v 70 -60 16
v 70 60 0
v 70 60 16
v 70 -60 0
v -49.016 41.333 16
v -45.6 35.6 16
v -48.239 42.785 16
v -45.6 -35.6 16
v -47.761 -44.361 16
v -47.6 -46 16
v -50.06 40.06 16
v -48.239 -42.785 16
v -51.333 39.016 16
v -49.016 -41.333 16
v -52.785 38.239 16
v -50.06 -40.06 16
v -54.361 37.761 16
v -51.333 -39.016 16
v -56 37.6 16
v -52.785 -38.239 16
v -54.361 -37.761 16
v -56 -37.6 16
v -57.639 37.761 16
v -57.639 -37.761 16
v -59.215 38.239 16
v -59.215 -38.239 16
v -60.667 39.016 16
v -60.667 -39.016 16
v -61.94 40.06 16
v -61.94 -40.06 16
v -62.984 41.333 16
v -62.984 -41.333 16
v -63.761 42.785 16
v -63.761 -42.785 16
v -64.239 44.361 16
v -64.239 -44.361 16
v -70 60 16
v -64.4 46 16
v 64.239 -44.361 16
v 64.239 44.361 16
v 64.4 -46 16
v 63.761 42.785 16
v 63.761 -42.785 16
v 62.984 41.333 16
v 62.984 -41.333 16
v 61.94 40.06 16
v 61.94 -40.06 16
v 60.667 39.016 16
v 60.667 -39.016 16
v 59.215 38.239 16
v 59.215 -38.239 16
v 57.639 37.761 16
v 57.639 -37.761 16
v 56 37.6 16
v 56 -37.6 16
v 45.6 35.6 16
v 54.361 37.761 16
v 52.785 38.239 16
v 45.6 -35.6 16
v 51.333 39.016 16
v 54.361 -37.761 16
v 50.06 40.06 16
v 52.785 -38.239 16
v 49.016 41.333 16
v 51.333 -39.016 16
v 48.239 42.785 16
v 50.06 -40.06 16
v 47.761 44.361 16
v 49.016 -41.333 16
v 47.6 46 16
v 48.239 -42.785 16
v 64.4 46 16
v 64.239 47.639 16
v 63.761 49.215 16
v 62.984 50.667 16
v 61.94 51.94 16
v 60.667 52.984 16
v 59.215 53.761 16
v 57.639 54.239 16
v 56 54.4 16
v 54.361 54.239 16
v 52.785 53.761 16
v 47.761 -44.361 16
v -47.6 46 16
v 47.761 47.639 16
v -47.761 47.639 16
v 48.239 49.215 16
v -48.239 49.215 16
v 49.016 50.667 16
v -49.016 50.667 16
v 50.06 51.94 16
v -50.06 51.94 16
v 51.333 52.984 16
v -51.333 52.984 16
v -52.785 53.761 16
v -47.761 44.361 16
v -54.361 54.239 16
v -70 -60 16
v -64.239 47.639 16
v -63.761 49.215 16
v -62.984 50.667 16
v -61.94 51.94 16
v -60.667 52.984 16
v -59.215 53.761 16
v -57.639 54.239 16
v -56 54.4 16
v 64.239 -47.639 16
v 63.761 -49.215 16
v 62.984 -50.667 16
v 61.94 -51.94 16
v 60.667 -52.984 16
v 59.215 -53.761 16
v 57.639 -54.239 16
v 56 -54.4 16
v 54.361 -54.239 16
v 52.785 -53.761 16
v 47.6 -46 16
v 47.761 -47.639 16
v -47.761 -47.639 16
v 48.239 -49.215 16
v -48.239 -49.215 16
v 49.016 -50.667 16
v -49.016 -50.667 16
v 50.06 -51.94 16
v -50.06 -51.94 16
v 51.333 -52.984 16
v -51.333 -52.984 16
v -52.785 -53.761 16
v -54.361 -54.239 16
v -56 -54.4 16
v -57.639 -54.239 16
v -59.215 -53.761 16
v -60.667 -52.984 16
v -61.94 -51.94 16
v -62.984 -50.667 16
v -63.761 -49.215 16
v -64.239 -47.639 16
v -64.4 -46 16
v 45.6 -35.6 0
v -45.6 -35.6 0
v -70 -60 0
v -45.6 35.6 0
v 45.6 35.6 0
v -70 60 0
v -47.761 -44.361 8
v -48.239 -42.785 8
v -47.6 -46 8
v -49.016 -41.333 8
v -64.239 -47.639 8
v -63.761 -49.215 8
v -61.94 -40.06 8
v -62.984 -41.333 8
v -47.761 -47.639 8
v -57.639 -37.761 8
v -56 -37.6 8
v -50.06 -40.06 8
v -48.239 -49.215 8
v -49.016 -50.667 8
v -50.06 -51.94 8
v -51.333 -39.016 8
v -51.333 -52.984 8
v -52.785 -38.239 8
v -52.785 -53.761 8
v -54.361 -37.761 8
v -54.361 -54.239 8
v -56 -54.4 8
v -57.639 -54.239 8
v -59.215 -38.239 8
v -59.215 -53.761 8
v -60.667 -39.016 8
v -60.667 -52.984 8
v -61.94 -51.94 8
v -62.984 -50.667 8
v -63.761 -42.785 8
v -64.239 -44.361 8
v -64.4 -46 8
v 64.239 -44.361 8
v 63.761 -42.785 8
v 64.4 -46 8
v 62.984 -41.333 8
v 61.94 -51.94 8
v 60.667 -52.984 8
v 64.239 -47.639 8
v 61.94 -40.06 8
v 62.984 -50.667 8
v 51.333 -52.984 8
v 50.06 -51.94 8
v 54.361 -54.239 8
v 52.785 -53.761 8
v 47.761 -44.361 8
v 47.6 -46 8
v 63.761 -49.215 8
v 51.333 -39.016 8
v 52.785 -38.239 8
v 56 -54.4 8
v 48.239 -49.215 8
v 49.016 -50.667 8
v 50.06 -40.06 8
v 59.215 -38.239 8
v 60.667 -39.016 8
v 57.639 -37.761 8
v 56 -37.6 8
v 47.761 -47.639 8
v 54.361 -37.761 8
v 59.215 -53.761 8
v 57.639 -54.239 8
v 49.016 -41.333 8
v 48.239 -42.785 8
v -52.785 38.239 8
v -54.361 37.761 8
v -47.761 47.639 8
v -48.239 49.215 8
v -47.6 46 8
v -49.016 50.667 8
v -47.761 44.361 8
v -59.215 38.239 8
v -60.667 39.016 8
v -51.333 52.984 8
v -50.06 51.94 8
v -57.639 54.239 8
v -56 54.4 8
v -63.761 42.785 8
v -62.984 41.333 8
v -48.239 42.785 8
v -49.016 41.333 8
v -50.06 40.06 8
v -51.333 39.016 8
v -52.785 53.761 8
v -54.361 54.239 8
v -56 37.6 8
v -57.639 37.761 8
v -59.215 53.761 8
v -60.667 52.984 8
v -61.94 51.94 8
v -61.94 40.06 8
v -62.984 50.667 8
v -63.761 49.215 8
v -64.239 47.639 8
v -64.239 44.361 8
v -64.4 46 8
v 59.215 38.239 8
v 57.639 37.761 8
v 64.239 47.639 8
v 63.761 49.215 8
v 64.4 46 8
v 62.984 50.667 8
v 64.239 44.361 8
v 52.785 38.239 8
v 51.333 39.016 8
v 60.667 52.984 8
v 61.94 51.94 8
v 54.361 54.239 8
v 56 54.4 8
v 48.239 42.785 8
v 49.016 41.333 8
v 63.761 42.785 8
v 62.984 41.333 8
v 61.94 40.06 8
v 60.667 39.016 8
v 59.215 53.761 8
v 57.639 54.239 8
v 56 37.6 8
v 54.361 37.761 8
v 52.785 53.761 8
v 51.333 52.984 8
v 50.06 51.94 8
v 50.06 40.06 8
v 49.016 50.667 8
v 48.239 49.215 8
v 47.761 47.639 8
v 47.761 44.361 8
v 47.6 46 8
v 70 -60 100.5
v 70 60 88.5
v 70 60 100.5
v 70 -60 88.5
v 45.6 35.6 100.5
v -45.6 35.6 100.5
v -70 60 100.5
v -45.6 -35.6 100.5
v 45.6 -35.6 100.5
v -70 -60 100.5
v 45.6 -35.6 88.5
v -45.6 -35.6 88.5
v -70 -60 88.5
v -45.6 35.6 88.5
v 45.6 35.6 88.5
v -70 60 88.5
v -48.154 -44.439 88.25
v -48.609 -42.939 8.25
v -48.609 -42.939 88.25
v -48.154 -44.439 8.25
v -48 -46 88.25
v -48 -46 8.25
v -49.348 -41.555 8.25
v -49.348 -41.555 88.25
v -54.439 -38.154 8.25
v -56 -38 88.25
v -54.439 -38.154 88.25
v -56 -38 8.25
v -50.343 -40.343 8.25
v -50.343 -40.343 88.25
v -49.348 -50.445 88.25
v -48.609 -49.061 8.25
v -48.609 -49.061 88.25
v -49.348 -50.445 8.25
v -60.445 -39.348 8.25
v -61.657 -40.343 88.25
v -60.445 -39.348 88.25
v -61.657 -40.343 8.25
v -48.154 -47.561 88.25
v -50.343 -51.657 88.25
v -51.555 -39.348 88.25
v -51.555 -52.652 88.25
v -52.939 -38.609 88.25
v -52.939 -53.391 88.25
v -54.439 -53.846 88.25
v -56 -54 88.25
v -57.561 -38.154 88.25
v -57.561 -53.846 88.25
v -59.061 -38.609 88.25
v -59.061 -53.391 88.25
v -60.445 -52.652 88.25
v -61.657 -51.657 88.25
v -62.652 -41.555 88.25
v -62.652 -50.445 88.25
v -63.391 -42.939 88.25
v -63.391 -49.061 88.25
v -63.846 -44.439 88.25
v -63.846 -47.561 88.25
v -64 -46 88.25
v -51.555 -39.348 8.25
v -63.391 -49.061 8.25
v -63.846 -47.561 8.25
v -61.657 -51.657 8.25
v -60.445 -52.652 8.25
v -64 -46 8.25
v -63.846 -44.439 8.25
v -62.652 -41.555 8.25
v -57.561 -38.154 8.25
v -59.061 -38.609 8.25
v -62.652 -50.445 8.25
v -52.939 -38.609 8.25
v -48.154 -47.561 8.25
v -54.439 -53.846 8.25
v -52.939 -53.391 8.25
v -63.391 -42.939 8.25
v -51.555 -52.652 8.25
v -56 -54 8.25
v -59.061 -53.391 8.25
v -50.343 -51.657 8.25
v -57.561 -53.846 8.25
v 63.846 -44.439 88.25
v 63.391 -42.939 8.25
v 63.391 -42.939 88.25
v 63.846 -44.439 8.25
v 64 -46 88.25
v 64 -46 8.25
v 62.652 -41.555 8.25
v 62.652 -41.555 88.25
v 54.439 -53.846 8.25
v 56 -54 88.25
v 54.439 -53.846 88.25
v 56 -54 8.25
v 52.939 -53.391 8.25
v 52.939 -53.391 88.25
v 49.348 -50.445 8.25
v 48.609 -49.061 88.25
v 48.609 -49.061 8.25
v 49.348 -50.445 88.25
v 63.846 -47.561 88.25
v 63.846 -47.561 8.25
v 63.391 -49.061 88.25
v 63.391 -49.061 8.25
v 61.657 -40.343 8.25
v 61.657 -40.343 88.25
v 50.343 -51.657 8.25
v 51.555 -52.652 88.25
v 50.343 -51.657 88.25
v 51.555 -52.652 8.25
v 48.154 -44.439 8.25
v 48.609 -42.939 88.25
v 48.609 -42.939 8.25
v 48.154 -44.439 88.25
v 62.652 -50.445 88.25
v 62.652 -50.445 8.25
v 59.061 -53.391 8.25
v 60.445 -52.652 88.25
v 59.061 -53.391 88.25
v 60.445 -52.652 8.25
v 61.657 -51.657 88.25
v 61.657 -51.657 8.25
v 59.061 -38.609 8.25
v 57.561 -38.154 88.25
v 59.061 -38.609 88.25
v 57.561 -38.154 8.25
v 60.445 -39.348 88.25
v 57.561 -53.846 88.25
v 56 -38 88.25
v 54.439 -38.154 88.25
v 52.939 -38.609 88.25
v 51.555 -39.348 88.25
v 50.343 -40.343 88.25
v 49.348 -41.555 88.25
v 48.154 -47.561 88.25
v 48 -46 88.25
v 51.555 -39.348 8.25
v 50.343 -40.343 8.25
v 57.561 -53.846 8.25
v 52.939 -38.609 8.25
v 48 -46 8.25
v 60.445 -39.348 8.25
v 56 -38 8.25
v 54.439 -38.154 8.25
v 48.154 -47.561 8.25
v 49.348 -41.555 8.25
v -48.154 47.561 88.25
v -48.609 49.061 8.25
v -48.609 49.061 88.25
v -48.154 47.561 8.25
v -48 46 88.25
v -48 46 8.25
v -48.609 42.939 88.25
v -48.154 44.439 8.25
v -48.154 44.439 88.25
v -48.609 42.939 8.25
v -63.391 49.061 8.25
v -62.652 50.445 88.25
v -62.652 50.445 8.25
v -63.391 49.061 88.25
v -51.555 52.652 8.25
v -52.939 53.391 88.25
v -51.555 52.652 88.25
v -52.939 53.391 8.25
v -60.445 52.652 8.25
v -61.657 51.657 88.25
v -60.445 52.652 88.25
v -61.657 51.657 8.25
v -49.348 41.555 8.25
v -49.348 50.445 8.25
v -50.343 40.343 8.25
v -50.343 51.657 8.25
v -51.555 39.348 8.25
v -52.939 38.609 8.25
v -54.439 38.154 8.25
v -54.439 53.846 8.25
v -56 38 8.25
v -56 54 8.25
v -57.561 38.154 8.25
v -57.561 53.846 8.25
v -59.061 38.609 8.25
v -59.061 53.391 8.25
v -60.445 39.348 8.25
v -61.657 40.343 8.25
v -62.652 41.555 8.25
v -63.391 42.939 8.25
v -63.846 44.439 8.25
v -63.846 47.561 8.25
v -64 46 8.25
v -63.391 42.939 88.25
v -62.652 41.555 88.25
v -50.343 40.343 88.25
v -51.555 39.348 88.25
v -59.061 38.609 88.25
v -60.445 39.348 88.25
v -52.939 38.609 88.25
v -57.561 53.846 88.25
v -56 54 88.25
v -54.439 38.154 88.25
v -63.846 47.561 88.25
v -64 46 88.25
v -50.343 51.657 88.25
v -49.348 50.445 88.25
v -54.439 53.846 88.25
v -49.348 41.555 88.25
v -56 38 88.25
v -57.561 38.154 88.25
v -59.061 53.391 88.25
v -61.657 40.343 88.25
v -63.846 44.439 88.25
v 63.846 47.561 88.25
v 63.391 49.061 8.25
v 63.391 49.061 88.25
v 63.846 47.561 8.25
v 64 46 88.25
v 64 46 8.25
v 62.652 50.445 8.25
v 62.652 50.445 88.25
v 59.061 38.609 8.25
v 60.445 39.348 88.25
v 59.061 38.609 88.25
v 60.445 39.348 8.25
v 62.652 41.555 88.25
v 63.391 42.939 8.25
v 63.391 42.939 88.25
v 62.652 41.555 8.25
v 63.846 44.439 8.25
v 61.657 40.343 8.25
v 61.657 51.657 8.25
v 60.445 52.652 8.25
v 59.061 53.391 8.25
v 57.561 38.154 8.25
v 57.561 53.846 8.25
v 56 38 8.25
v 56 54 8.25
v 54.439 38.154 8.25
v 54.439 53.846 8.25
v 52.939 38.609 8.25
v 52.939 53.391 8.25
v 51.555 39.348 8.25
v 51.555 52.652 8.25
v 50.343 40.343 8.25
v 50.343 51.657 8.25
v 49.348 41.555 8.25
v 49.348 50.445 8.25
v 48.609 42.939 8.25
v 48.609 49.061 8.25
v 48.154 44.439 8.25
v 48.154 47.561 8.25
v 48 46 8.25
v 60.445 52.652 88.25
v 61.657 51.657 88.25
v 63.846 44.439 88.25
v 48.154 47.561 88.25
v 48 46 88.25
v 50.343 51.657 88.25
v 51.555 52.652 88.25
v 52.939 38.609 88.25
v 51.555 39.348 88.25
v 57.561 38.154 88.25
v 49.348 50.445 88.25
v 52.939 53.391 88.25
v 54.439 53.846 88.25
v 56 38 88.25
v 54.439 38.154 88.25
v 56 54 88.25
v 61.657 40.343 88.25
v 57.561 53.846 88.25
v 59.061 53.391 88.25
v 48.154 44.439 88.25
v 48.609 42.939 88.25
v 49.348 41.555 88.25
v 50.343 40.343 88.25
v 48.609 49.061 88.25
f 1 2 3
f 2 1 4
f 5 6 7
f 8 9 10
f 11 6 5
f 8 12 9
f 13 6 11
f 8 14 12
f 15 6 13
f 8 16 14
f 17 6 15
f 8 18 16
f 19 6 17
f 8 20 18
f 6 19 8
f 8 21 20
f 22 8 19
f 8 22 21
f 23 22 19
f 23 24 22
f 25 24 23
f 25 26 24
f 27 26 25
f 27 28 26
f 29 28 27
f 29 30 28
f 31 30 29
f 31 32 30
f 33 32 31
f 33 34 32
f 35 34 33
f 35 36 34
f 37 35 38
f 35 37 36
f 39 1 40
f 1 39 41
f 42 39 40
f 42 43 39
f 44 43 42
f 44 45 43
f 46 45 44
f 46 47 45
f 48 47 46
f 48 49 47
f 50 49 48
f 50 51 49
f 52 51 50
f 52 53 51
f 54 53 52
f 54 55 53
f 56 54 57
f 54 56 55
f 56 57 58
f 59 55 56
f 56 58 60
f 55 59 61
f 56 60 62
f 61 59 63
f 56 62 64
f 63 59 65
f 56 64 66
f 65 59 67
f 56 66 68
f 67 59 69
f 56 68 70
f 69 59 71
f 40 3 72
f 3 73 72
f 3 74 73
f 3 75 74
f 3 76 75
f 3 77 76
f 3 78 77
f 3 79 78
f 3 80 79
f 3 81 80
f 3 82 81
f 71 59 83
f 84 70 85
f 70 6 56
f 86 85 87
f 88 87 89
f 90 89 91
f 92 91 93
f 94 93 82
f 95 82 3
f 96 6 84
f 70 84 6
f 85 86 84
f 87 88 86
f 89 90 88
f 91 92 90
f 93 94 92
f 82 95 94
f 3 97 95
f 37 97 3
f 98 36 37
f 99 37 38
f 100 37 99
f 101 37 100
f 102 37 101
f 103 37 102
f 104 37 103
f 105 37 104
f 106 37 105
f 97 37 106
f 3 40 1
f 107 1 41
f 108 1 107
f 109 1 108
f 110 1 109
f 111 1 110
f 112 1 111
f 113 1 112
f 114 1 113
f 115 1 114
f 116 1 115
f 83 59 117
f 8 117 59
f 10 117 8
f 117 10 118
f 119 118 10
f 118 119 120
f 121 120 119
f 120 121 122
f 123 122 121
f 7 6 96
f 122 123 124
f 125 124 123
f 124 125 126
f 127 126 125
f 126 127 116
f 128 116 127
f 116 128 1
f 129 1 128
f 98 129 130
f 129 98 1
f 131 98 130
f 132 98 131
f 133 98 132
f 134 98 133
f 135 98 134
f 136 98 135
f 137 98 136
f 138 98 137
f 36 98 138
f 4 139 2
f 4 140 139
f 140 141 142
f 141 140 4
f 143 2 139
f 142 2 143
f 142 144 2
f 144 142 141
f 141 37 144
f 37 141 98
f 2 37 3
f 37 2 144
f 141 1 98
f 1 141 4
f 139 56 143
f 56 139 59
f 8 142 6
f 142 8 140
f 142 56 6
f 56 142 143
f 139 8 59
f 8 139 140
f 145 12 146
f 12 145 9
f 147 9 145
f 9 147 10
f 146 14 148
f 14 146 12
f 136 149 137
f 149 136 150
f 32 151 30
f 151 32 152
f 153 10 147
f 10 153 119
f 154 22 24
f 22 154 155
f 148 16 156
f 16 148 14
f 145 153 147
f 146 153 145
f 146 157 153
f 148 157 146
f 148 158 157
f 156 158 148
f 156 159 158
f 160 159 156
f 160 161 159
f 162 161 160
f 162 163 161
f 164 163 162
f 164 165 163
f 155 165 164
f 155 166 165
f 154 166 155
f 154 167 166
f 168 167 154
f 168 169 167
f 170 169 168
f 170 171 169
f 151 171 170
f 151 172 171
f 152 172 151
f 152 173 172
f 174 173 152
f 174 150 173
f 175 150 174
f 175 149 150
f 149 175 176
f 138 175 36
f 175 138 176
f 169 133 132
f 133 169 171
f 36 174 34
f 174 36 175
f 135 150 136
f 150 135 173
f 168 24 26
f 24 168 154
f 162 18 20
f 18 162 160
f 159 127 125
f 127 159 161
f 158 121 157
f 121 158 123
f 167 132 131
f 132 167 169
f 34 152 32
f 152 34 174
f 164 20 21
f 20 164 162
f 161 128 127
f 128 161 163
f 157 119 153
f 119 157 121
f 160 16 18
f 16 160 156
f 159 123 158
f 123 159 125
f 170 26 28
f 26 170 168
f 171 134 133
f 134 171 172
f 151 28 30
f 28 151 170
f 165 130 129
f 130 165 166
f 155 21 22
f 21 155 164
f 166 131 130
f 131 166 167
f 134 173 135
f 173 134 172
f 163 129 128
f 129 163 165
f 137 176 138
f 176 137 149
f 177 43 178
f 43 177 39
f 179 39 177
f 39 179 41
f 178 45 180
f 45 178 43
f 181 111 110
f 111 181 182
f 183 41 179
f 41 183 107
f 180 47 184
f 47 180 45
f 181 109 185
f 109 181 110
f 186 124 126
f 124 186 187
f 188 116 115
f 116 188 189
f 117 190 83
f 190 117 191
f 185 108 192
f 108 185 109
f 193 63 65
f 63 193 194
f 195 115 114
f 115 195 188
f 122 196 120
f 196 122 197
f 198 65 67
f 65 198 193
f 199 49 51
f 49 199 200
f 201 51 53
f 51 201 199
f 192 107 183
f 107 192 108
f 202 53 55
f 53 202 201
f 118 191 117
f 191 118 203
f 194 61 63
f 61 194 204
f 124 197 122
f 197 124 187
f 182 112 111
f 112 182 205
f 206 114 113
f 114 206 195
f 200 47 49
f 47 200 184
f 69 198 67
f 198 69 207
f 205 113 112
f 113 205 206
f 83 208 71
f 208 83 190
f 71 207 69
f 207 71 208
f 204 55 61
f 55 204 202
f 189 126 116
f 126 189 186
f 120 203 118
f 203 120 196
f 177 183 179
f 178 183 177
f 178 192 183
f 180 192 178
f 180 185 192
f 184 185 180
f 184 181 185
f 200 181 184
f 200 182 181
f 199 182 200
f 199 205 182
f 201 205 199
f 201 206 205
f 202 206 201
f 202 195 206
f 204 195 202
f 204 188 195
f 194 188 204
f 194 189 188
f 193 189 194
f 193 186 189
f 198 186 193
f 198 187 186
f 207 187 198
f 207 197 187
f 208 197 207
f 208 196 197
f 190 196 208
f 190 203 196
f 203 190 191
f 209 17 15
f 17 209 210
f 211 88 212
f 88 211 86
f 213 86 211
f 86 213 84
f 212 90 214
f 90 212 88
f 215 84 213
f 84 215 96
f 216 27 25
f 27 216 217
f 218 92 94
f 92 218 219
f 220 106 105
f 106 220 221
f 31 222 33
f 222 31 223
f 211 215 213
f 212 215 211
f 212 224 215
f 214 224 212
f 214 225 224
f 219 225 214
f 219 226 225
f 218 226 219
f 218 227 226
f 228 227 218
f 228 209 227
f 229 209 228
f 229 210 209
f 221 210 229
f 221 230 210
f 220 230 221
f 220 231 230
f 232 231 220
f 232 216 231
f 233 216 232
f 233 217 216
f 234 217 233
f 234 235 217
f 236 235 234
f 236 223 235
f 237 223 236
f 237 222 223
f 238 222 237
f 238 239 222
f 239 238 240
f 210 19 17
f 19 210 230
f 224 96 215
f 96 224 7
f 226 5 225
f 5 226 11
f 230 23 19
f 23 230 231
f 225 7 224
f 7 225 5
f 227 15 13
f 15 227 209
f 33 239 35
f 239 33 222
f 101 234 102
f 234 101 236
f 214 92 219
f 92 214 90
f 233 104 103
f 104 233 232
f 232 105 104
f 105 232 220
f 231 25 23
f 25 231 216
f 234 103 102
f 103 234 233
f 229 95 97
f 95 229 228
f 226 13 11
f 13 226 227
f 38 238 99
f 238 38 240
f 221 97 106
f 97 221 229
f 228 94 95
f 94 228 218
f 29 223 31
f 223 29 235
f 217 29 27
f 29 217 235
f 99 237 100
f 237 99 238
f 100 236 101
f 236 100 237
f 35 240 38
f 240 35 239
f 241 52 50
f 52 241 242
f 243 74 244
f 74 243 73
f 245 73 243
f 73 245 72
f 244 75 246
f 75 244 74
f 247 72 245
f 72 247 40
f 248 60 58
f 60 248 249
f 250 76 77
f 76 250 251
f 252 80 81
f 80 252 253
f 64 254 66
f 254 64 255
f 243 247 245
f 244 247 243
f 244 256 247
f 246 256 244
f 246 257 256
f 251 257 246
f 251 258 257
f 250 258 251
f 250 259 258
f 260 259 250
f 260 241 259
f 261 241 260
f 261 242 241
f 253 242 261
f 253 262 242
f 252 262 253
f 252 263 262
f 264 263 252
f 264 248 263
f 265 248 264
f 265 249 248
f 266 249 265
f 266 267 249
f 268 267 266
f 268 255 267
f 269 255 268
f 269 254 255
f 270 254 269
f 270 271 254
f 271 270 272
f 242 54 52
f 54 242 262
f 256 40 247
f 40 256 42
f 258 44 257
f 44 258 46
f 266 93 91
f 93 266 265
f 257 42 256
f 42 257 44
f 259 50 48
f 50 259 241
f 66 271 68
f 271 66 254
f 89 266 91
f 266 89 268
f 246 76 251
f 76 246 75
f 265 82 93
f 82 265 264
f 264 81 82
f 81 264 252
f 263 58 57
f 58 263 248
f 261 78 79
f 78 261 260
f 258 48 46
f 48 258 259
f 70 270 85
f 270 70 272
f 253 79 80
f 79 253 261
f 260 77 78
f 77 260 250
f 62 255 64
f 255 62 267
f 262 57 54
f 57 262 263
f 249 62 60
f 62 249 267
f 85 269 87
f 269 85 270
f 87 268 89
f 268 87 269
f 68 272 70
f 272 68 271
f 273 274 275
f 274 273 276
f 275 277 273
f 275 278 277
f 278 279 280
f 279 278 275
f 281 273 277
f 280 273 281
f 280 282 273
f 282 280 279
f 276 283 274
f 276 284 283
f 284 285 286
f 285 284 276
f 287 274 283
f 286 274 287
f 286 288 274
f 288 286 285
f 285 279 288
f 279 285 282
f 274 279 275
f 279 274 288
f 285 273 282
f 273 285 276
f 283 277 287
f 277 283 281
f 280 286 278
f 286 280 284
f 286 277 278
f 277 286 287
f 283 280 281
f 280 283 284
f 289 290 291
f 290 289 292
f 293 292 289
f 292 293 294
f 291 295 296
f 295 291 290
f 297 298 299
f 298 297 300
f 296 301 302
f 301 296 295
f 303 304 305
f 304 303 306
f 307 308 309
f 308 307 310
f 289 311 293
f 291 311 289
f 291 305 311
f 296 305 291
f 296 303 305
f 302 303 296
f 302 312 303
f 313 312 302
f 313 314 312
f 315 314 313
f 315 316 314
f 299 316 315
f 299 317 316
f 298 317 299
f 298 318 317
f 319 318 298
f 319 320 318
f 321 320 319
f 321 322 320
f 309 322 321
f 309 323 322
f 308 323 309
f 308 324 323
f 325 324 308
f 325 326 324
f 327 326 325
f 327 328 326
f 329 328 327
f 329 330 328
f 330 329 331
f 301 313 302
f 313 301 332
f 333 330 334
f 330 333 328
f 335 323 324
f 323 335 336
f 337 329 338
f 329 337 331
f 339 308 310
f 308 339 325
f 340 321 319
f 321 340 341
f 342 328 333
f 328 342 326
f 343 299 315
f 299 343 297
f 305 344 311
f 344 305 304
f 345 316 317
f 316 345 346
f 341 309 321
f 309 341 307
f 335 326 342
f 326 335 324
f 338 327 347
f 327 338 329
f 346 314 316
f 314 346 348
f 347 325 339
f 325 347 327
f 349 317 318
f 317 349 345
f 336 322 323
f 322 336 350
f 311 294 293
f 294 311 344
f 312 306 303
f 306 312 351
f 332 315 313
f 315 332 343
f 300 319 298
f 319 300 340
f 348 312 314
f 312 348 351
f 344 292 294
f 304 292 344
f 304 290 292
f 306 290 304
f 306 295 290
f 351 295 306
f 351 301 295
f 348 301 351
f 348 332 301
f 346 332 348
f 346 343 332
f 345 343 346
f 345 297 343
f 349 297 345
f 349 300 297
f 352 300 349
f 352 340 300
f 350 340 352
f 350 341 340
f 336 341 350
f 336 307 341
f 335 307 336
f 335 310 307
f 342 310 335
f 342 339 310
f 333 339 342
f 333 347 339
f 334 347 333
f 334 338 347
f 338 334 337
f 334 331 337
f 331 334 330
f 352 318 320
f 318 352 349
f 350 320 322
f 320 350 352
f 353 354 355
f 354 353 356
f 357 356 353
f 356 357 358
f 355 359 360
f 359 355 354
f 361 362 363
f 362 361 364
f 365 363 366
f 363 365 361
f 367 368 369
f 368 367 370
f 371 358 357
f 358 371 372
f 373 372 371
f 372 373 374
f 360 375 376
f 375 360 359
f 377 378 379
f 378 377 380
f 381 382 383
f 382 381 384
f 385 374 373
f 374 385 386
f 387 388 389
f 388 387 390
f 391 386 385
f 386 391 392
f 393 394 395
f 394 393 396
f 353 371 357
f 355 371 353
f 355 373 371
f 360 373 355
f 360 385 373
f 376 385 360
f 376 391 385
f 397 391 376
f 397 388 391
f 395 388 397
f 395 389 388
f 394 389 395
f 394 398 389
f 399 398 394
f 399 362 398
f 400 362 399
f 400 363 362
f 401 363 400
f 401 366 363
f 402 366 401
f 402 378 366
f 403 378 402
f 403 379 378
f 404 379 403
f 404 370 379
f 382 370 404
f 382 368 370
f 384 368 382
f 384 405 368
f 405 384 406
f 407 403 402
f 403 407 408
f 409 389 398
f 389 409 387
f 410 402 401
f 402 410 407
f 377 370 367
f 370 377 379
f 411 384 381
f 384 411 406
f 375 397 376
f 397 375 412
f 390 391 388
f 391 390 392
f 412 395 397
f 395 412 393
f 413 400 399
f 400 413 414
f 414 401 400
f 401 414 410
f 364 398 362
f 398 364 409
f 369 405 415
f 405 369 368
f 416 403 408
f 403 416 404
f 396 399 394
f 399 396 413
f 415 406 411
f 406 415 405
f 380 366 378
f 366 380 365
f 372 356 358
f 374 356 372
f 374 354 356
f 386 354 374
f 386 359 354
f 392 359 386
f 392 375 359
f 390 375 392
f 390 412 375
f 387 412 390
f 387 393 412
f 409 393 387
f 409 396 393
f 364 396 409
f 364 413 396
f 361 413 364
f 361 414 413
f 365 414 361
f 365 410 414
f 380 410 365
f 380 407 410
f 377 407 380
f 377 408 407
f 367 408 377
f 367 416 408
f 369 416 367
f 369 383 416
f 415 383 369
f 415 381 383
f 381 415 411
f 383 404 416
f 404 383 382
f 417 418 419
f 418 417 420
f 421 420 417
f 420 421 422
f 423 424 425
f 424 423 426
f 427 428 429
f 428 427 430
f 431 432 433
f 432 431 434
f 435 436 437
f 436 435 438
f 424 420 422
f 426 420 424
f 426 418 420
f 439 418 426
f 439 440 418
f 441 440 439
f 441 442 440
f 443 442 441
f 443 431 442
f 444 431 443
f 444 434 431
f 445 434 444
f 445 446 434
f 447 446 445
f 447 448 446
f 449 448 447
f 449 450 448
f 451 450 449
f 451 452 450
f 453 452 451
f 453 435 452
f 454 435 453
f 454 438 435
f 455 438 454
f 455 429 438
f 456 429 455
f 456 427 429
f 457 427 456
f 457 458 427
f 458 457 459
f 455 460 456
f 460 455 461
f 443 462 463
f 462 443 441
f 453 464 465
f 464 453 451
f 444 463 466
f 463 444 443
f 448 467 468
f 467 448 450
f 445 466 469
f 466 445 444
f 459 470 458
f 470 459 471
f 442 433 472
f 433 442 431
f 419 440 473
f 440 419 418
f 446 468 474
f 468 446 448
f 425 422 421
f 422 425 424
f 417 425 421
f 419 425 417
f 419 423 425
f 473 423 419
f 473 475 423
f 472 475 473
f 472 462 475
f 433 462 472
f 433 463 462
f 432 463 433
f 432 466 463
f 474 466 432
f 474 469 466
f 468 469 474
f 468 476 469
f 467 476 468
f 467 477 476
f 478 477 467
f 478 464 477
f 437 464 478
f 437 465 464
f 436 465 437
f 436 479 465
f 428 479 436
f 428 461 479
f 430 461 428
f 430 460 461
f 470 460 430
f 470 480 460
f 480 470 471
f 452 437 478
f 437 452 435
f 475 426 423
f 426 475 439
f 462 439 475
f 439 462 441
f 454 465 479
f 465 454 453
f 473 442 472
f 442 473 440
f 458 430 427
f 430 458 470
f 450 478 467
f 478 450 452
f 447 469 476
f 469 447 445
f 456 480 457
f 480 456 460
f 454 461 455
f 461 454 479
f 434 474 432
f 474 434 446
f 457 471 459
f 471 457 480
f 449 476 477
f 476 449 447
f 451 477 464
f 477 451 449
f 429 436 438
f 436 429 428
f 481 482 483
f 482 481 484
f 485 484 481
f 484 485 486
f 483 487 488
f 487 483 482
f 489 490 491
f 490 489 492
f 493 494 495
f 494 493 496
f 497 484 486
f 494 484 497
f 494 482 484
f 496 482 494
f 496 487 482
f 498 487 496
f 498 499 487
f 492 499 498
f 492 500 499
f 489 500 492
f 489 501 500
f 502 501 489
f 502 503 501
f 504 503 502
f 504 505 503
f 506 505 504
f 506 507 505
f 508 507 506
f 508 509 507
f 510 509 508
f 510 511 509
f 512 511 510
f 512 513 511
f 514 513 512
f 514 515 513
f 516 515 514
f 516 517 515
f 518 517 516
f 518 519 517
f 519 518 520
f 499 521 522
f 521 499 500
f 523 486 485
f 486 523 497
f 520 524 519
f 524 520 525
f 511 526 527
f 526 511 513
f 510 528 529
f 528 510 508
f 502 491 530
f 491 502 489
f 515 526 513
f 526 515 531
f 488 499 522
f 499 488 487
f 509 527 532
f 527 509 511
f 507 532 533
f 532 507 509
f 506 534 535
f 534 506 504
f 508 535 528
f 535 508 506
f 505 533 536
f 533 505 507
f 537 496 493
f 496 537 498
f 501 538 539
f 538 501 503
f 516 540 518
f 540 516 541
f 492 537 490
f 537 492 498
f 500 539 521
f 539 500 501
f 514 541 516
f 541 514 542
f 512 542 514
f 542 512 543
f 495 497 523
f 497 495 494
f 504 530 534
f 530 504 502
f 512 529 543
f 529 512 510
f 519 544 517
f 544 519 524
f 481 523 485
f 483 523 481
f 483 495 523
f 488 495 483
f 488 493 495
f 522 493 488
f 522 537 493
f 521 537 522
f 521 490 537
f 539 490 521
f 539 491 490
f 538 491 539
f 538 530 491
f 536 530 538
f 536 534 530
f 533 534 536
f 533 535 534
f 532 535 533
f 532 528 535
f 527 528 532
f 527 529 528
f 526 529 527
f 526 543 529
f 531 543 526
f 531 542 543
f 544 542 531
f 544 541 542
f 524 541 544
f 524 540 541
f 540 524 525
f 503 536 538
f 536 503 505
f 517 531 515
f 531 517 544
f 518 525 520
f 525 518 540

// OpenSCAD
$fn = 32;

// ------------------------------------------------------------------------
// Frame cube: base 140 x 120 mm, posts 80 mm tall
// Every part is its own module, assembly() places every instance.
// ------------------------------------------------------------------------

// --- part 1 ---
module base_frame() {
  difference() {
    translate([-70, -60, 0]) cube([140, 120, 16]);
    translate([-45.6, -35.6, -1]) cube([91.2, 71.2, 18]);
    translate([-56, -46, 8]) cylinder(h = 9, d = 16.8);
    translate([56, -46, 8]) cylinder(h = 9, d = 16.8);
    translate([-56, 46, 8]) cylinder(h = 9, d = 16.8);
    translate([56, 46, 8]) cylinder(h = 9, d = 16.8);
  }
}

// --- part 2 ---
module corner_post() {
  cylinder(h = 80, d = 16);
}

// --- part 3 ---
module top_frame() {
  difference() {
    translate([-70, -60, 0]) cube([140, 120, 12]);
    translate([-45.6, -35.6, -1]) cube([91.2, 71.2, 14]);
  }
}

// --- assembly ---
module assembly() {
  color([0.80, 0.24, 0.20]) translate([0, 0, 0]) rotate([0, 0, 0]) base_frame();
  color([0.20, 0.45, 0.75]) translate([-56, -46, 8.25]) rotate([0, 0, 0]) corner_post();
  color([0.25, 0.62, 0.32]) translate([56, -46, 8.25]) rotate([0, 0, 0]) corner_post();
  color([0.92, 0.70, 0.18]) translate([-56, 46, 8.25]) rotate([0, 0, 0]) corner_post();
  color([0.58, 0.35, 0.70]) translate([56, 46, 8.25]) rotate([0, 0, 0]) corner_post();
  color([0.16, 0.66, 0.66]) translate([0, 0, 88.5]) rotate([0, 0, 0]) top_frame();
}

assembly();
